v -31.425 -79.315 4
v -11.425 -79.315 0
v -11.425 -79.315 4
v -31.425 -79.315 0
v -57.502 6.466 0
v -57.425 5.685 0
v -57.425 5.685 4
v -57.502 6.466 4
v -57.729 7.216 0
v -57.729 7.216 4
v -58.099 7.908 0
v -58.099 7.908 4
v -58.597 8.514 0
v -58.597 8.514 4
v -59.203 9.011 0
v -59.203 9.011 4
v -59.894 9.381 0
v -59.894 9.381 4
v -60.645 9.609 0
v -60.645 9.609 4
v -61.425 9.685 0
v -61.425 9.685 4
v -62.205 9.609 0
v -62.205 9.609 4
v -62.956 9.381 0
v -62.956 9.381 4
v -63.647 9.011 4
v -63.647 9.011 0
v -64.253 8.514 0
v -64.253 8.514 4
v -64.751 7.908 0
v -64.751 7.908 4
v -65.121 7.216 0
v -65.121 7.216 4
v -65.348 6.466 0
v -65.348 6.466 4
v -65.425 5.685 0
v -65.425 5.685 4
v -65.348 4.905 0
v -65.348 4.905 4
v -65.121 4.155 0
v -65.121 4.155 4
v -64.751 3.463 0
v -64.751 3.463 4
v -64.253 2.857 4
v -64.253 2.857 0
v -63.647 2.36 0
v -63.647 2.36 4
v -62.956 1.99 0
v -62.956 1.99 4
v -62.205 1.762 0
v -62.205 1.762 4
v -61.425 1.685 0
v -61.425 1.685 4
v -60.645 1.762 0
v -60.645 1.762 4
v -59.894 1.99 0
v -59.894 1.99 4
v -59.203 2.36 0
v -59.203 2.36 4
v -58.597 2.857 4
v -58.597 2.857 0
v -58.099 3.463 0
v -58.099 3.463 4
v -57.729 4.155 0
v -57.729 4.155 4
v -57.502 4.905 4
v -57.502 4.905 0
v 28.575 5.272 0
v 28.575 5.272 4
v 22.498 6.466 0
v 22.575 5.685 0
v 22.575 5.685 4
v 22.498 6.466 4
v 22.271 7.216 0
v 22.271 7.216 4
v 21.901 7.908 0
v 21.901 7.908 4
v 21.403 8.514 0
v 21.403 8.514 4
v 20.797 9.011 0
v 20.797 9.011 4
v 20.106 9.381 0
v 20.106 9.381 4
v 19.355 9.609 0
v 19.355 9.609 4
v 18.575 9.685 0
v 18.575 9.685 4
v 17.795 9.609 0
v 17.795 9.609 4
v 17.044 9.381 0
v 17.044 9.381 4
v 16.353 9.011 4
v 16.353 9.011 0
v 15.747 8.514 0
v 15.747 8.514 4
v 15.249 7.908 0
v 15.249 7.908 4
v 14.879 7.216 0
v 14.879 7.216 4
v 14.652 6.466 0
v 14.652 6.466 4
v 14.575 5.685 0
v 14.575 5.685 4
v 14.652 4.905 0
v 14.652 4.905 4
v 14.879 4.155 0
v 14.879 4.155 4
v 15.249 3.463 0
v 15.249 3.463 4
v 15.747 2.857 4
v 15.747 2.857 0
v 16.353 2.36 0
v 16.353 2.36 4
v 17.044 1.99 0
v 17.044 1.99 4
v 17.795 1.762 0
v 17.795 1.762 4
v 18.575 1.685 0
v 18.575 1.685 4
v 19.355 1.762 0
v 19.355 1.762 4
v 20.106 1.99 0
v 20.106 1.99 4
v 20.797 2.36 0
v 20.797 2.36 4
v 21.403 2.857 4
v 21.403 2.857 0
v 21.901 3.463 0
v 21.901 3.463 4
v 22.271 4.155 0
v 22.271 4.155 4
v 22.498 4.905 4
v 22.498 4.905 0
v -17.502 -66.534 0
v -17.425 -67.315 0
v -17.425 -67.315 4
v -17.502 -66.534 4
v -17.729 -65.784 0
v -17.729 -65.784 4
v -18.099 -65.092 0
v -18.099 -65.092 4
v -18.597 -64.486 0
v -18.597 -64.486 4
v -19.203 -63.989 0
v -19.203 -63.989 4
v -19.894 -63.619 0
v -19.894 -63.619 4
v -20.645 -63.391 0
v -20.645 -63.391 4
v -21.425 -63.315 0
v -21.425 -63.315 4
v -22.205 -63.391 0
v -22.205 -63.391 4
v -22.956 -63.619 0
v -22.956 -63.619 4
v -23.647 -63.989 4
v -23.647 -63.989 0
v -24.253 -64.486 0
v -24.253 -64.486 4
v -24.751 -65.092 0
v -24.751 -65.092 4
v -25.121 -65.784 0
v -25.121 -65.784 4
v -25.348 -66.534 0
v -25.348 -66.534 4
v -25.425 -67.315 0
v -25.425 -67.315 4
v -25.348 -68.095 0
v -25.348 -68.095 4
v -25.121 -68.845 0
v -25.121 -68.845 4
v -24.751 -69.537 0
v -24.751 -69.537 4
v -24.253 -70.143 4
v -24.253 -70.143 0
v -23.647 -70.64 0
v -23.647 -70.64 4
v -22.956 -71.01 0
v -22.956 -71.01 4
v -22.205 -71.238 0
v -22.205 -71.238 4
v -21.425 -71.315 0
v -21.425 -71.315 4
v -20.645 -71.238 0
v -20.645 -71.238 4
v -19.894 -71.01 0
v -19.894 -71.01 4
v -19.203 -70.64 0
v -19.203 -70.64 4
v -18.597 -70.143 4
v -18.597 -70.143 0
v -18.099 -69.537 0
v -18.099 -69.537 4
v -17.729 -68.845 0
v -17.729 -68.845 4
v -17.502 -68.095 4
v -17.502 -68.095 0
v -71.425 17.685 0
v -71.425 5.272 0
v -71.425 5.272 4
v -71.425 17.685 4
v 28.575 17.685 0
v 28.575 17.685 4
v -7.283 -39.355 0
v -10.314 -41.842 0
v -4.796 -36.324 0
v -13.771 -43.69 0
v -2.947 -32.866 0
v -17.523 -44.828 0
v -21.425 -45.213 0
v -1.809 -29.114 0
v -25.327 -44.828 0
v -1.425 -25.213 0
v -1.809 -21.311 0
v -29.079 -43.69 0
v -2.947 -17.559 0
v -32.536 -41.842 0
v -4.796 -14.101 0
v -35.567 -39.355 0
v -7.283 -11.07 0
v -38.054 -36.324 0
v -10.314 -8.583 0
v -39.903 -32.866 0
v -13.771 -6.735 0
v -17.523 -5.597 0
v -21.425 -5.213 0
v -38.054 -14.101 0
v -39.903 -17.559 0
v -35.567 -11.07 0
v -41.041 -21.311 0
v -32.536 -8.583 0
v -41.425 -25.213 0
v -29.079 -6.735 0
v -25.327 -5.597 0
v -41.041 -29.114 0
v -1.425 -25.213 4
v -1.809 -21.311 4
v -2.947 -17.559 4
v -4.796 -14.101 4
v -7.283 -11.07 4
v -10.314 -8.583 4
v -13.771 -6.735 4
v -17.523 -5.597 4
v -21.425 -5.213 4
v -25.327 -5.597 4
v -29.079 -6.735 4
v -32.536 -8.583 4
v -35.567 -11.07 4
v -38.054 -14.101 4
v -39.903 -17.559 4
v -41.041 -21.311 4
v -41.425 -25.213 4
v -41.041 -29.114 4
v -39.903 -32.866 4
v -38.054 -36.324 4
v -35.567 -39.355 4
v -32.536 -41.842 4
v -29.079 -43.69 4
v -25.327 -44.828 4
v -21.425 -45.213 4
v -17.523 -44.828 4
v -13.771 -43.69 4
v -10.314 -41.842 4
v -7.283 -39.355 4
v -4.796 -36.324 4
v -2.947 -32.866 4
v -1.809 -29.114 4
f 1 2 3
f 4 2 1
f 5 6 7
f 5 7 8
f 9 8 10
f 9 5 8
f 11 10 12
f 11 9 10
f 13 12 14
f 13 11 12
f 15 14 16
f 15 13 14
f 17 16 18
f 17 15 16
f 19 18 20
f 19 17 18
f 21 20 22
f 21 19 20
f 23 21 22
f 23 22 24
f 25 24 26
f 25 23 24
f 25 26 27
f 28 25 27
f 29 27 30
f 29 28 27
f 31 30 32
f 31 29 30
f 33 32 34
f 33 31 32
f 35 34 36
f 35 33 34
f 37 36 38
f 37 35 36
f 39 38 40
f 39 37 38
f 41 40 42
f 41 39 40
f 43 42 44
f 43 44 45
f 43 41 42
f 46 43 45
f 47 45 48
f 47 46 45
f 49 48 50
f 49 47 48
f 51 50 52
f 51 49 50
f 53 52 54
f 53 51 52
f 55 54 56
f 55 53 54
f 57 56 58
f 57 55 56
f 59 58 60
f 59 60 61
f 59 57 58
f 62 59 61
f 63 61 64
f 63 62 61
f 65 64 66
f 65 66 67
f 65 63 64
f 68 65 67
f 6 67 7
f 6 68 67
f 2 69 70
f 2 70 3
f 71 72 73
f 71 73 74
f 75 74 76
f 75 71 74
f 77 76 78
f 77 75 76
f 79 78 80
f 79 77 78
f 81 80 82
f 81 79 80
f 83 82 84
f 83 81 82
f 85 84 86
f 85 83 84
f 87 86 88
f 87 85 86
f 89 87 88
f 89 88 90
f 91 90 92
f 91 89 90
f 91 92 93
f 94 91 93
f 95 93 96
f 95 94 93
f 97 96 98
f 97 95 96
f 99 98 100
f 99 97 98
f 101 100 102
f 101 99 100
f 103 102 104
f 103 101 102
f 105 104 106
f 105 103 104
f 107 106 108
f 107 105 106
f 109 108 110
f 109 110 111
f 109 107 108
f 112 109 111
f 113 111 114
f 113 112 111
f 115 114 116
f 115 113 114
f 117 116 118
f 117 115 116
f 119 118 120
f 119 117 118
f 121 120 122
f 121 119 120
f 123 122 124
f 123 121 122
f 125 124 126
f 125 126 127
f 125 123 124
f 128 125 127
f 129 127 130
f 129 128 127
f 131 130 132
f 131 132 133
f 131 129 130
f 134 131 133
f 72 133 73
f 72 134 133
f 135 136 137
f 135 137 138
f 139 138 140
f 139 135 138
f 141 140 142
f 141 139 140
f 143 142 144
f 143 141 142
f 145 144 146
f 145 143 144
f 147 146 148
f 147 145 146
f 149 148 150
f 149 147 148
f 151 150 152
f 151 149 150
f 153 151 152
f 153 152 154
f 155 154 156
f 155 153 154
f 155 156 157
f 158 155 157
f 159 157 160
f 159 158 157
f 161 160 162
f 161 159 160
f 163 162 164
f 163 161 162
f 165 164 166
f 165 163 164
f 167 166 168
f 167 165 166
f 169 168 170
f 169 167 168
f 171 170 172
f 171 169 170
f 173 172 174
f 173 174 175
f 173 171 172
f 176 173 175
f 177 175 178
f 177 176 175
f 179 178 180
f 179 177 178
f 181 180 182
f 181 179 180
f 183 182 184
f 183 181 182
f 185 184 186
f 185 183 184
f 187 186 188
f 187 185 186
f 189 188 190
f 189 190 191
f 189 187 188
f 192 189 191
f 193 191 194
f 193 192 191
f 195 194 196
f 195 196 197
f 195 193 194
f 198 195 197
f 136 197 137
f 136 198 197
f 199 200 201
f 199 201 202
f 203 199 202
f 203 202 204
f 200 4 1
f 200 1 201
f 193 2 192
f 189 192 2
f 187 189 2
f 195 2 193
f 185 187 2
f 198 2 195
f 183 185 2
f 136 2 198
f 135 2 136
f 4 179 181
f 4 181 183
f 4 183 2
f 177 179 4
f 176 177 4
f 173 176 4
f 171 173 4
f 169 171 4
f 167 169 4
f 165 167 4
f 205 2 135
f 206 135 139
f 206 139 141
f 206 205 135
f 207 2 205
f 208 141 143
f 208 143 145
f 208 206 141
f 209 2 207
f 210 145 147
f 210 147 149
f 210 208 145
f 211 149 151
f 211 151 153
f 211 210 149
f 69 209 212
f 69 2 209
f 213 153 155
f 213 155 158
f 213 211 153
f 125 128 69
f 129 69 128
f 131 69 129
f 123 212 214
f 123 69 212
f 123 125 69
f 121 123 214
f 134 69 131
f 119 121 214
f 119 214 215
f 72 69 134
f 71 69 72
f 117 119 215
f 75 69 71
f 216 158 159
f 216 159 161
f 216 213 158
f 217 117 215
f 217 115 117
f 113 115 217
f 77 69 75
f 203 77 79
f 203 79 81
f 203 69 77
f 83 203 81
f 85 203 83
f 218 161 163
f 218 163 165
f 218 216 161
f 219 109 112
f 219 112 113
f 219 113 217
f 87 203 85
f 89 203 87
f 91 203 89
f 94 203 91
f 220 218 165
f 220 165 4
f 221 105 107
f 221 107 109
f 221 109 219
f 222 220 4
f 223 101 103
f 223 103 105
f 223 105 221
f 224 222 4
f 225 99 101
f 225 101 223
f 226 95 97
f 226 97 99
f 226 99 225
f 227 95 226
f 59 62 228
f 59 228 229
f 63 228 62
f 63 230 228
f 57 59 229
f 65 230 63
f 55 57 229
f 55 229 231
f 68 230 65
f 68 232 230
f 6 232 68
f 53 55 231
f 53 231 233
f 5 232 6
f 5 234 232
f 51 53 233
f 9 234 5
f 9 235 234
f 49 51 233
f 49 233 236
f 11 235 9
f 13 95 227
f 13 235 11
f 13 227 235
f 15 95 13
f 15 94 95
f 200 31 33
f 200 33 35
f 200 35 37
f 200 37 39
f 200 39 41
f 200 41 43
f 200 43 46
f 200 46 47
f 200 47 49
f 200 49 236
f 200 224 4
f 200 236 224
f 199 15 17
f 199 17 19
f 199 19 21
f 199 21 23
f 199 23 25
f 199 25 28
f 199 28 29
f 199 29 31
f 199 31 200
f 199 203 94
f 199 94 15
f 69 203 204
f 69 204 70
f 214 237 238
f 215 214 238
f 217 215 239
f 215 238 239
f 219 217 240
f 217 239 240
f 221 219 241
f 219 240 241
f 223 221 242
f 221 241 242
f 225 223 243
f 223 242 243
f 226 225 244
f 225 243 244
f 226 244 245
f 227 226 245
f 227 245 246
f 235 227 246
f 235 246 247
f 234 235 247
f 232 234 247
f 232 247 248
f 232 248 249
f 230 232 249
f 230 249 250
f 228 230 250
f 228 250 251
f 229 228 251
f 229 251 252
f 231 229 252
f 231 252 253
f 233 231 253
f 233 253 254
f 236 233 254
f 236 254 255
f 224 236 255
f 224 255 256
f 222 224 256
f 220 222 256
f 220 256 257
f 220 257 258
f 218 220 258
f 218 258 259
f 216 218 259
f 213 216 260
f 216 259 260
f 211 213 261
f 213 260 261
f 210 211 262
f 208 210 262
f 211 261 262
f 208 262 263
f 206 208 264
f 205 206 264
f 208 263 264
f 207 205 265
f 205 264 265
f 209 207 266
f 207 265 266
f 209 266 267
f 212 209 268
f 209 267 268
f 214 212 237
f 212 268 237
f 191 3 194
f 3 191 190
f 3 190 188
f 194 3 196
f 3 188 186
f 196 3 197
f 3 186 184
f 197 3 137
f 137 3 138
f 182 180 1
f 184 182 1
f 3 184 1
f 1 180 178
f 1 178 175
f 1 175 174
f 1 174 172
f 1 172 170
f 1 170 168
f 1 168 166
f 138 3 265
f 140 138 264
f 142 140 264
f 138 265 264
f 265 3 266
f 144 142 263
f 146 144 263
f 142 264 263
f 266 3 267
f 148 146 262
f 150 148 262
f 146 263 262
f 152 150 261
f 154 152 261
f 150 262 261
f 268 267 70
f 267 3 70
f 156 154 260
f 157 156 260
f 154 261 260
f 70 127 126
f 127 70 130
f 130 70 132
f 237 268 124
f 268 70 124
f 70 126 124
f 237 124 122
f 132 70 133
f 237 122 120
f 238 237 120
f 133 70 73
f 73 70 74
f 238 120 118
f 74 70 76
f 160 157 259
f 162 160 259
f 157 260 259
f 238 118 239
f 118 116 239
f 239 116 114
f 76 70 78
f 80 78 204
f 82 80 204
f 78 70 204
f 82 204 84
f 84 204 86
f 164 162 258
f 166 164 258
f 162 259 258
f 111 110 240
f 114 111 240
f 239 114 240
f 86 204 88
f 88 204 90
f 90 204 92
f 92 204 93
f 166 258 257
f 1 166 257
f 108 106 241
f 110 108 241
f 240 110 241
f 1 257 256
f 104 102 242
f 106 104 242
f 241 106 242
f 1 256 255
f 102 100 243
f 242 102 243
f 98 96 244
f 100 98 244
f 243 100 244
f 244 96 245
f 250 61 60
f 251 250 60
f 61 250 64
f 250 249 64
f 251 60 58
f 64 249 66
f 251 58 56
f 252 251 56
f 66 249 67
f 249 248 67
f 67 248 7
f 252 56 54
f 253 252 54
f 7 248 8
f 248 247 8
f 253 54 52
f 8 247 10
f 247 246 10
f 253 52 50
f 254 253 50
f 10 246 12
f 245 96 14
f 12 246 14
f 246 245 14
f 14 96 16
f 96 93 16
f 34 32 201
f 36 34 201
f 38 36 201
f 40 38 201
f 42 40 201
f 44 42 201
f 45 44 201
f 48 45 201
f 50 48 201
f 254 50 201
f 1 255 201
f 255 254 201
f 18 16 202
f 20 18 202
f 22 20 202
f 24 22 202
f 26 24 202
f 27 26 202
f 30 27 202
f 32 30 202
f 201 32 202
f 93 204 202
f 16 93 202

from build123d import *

# Parameters (mm, degrees)
SKETCH1_R           = 4
BOSS_EXTRUDE1_DEPTH = 4
SKETCH2_R           = 20
CUT_EXTRUDE1_DEPTH  = 10


with BuildPart() as part:
    # Sketch1 → Boss-Extrude1 (new body)
    with BuildSketch(Plane.XY):
        Polygon((-71.425004503, 17.68546584), (28.574995497, 17.68546584), (28.574995497, 5.27207622), (-11.425004503, -79.31453416), (-31.425004503, -79.31453416), (-71.425004503, 5.27207622), align=None)
        with Locations((-61.425004503, 5.68546584)):
            Circle(SKETCH1_R, mode=Mode.SUBTRACT)
        with Locations((18.574995497, 5.68546584)):
            Circle(SKETCH1_R, mode=Mode.SUBTRACT)
        with Locations((-21.425004503, -67.31453416)):
            Circle(SKETCH1_R, mode=Mode.SUBTRACT)
    extrude(amount=BOSS_EXTRUDE1_DEPTH)

    # Sketch2 → Cut-Extrude1 (cut)
    with BuildSketch(Plane.XY.offset(4)):
        with Locations((-21.425004503, -25.21253416)):
            Circle(SKETCH2_R)
    extrude(amount=-CUT_EXTRUDE1_DEPTH, mode=Mode.SUBTRACT)


solid = part.part
